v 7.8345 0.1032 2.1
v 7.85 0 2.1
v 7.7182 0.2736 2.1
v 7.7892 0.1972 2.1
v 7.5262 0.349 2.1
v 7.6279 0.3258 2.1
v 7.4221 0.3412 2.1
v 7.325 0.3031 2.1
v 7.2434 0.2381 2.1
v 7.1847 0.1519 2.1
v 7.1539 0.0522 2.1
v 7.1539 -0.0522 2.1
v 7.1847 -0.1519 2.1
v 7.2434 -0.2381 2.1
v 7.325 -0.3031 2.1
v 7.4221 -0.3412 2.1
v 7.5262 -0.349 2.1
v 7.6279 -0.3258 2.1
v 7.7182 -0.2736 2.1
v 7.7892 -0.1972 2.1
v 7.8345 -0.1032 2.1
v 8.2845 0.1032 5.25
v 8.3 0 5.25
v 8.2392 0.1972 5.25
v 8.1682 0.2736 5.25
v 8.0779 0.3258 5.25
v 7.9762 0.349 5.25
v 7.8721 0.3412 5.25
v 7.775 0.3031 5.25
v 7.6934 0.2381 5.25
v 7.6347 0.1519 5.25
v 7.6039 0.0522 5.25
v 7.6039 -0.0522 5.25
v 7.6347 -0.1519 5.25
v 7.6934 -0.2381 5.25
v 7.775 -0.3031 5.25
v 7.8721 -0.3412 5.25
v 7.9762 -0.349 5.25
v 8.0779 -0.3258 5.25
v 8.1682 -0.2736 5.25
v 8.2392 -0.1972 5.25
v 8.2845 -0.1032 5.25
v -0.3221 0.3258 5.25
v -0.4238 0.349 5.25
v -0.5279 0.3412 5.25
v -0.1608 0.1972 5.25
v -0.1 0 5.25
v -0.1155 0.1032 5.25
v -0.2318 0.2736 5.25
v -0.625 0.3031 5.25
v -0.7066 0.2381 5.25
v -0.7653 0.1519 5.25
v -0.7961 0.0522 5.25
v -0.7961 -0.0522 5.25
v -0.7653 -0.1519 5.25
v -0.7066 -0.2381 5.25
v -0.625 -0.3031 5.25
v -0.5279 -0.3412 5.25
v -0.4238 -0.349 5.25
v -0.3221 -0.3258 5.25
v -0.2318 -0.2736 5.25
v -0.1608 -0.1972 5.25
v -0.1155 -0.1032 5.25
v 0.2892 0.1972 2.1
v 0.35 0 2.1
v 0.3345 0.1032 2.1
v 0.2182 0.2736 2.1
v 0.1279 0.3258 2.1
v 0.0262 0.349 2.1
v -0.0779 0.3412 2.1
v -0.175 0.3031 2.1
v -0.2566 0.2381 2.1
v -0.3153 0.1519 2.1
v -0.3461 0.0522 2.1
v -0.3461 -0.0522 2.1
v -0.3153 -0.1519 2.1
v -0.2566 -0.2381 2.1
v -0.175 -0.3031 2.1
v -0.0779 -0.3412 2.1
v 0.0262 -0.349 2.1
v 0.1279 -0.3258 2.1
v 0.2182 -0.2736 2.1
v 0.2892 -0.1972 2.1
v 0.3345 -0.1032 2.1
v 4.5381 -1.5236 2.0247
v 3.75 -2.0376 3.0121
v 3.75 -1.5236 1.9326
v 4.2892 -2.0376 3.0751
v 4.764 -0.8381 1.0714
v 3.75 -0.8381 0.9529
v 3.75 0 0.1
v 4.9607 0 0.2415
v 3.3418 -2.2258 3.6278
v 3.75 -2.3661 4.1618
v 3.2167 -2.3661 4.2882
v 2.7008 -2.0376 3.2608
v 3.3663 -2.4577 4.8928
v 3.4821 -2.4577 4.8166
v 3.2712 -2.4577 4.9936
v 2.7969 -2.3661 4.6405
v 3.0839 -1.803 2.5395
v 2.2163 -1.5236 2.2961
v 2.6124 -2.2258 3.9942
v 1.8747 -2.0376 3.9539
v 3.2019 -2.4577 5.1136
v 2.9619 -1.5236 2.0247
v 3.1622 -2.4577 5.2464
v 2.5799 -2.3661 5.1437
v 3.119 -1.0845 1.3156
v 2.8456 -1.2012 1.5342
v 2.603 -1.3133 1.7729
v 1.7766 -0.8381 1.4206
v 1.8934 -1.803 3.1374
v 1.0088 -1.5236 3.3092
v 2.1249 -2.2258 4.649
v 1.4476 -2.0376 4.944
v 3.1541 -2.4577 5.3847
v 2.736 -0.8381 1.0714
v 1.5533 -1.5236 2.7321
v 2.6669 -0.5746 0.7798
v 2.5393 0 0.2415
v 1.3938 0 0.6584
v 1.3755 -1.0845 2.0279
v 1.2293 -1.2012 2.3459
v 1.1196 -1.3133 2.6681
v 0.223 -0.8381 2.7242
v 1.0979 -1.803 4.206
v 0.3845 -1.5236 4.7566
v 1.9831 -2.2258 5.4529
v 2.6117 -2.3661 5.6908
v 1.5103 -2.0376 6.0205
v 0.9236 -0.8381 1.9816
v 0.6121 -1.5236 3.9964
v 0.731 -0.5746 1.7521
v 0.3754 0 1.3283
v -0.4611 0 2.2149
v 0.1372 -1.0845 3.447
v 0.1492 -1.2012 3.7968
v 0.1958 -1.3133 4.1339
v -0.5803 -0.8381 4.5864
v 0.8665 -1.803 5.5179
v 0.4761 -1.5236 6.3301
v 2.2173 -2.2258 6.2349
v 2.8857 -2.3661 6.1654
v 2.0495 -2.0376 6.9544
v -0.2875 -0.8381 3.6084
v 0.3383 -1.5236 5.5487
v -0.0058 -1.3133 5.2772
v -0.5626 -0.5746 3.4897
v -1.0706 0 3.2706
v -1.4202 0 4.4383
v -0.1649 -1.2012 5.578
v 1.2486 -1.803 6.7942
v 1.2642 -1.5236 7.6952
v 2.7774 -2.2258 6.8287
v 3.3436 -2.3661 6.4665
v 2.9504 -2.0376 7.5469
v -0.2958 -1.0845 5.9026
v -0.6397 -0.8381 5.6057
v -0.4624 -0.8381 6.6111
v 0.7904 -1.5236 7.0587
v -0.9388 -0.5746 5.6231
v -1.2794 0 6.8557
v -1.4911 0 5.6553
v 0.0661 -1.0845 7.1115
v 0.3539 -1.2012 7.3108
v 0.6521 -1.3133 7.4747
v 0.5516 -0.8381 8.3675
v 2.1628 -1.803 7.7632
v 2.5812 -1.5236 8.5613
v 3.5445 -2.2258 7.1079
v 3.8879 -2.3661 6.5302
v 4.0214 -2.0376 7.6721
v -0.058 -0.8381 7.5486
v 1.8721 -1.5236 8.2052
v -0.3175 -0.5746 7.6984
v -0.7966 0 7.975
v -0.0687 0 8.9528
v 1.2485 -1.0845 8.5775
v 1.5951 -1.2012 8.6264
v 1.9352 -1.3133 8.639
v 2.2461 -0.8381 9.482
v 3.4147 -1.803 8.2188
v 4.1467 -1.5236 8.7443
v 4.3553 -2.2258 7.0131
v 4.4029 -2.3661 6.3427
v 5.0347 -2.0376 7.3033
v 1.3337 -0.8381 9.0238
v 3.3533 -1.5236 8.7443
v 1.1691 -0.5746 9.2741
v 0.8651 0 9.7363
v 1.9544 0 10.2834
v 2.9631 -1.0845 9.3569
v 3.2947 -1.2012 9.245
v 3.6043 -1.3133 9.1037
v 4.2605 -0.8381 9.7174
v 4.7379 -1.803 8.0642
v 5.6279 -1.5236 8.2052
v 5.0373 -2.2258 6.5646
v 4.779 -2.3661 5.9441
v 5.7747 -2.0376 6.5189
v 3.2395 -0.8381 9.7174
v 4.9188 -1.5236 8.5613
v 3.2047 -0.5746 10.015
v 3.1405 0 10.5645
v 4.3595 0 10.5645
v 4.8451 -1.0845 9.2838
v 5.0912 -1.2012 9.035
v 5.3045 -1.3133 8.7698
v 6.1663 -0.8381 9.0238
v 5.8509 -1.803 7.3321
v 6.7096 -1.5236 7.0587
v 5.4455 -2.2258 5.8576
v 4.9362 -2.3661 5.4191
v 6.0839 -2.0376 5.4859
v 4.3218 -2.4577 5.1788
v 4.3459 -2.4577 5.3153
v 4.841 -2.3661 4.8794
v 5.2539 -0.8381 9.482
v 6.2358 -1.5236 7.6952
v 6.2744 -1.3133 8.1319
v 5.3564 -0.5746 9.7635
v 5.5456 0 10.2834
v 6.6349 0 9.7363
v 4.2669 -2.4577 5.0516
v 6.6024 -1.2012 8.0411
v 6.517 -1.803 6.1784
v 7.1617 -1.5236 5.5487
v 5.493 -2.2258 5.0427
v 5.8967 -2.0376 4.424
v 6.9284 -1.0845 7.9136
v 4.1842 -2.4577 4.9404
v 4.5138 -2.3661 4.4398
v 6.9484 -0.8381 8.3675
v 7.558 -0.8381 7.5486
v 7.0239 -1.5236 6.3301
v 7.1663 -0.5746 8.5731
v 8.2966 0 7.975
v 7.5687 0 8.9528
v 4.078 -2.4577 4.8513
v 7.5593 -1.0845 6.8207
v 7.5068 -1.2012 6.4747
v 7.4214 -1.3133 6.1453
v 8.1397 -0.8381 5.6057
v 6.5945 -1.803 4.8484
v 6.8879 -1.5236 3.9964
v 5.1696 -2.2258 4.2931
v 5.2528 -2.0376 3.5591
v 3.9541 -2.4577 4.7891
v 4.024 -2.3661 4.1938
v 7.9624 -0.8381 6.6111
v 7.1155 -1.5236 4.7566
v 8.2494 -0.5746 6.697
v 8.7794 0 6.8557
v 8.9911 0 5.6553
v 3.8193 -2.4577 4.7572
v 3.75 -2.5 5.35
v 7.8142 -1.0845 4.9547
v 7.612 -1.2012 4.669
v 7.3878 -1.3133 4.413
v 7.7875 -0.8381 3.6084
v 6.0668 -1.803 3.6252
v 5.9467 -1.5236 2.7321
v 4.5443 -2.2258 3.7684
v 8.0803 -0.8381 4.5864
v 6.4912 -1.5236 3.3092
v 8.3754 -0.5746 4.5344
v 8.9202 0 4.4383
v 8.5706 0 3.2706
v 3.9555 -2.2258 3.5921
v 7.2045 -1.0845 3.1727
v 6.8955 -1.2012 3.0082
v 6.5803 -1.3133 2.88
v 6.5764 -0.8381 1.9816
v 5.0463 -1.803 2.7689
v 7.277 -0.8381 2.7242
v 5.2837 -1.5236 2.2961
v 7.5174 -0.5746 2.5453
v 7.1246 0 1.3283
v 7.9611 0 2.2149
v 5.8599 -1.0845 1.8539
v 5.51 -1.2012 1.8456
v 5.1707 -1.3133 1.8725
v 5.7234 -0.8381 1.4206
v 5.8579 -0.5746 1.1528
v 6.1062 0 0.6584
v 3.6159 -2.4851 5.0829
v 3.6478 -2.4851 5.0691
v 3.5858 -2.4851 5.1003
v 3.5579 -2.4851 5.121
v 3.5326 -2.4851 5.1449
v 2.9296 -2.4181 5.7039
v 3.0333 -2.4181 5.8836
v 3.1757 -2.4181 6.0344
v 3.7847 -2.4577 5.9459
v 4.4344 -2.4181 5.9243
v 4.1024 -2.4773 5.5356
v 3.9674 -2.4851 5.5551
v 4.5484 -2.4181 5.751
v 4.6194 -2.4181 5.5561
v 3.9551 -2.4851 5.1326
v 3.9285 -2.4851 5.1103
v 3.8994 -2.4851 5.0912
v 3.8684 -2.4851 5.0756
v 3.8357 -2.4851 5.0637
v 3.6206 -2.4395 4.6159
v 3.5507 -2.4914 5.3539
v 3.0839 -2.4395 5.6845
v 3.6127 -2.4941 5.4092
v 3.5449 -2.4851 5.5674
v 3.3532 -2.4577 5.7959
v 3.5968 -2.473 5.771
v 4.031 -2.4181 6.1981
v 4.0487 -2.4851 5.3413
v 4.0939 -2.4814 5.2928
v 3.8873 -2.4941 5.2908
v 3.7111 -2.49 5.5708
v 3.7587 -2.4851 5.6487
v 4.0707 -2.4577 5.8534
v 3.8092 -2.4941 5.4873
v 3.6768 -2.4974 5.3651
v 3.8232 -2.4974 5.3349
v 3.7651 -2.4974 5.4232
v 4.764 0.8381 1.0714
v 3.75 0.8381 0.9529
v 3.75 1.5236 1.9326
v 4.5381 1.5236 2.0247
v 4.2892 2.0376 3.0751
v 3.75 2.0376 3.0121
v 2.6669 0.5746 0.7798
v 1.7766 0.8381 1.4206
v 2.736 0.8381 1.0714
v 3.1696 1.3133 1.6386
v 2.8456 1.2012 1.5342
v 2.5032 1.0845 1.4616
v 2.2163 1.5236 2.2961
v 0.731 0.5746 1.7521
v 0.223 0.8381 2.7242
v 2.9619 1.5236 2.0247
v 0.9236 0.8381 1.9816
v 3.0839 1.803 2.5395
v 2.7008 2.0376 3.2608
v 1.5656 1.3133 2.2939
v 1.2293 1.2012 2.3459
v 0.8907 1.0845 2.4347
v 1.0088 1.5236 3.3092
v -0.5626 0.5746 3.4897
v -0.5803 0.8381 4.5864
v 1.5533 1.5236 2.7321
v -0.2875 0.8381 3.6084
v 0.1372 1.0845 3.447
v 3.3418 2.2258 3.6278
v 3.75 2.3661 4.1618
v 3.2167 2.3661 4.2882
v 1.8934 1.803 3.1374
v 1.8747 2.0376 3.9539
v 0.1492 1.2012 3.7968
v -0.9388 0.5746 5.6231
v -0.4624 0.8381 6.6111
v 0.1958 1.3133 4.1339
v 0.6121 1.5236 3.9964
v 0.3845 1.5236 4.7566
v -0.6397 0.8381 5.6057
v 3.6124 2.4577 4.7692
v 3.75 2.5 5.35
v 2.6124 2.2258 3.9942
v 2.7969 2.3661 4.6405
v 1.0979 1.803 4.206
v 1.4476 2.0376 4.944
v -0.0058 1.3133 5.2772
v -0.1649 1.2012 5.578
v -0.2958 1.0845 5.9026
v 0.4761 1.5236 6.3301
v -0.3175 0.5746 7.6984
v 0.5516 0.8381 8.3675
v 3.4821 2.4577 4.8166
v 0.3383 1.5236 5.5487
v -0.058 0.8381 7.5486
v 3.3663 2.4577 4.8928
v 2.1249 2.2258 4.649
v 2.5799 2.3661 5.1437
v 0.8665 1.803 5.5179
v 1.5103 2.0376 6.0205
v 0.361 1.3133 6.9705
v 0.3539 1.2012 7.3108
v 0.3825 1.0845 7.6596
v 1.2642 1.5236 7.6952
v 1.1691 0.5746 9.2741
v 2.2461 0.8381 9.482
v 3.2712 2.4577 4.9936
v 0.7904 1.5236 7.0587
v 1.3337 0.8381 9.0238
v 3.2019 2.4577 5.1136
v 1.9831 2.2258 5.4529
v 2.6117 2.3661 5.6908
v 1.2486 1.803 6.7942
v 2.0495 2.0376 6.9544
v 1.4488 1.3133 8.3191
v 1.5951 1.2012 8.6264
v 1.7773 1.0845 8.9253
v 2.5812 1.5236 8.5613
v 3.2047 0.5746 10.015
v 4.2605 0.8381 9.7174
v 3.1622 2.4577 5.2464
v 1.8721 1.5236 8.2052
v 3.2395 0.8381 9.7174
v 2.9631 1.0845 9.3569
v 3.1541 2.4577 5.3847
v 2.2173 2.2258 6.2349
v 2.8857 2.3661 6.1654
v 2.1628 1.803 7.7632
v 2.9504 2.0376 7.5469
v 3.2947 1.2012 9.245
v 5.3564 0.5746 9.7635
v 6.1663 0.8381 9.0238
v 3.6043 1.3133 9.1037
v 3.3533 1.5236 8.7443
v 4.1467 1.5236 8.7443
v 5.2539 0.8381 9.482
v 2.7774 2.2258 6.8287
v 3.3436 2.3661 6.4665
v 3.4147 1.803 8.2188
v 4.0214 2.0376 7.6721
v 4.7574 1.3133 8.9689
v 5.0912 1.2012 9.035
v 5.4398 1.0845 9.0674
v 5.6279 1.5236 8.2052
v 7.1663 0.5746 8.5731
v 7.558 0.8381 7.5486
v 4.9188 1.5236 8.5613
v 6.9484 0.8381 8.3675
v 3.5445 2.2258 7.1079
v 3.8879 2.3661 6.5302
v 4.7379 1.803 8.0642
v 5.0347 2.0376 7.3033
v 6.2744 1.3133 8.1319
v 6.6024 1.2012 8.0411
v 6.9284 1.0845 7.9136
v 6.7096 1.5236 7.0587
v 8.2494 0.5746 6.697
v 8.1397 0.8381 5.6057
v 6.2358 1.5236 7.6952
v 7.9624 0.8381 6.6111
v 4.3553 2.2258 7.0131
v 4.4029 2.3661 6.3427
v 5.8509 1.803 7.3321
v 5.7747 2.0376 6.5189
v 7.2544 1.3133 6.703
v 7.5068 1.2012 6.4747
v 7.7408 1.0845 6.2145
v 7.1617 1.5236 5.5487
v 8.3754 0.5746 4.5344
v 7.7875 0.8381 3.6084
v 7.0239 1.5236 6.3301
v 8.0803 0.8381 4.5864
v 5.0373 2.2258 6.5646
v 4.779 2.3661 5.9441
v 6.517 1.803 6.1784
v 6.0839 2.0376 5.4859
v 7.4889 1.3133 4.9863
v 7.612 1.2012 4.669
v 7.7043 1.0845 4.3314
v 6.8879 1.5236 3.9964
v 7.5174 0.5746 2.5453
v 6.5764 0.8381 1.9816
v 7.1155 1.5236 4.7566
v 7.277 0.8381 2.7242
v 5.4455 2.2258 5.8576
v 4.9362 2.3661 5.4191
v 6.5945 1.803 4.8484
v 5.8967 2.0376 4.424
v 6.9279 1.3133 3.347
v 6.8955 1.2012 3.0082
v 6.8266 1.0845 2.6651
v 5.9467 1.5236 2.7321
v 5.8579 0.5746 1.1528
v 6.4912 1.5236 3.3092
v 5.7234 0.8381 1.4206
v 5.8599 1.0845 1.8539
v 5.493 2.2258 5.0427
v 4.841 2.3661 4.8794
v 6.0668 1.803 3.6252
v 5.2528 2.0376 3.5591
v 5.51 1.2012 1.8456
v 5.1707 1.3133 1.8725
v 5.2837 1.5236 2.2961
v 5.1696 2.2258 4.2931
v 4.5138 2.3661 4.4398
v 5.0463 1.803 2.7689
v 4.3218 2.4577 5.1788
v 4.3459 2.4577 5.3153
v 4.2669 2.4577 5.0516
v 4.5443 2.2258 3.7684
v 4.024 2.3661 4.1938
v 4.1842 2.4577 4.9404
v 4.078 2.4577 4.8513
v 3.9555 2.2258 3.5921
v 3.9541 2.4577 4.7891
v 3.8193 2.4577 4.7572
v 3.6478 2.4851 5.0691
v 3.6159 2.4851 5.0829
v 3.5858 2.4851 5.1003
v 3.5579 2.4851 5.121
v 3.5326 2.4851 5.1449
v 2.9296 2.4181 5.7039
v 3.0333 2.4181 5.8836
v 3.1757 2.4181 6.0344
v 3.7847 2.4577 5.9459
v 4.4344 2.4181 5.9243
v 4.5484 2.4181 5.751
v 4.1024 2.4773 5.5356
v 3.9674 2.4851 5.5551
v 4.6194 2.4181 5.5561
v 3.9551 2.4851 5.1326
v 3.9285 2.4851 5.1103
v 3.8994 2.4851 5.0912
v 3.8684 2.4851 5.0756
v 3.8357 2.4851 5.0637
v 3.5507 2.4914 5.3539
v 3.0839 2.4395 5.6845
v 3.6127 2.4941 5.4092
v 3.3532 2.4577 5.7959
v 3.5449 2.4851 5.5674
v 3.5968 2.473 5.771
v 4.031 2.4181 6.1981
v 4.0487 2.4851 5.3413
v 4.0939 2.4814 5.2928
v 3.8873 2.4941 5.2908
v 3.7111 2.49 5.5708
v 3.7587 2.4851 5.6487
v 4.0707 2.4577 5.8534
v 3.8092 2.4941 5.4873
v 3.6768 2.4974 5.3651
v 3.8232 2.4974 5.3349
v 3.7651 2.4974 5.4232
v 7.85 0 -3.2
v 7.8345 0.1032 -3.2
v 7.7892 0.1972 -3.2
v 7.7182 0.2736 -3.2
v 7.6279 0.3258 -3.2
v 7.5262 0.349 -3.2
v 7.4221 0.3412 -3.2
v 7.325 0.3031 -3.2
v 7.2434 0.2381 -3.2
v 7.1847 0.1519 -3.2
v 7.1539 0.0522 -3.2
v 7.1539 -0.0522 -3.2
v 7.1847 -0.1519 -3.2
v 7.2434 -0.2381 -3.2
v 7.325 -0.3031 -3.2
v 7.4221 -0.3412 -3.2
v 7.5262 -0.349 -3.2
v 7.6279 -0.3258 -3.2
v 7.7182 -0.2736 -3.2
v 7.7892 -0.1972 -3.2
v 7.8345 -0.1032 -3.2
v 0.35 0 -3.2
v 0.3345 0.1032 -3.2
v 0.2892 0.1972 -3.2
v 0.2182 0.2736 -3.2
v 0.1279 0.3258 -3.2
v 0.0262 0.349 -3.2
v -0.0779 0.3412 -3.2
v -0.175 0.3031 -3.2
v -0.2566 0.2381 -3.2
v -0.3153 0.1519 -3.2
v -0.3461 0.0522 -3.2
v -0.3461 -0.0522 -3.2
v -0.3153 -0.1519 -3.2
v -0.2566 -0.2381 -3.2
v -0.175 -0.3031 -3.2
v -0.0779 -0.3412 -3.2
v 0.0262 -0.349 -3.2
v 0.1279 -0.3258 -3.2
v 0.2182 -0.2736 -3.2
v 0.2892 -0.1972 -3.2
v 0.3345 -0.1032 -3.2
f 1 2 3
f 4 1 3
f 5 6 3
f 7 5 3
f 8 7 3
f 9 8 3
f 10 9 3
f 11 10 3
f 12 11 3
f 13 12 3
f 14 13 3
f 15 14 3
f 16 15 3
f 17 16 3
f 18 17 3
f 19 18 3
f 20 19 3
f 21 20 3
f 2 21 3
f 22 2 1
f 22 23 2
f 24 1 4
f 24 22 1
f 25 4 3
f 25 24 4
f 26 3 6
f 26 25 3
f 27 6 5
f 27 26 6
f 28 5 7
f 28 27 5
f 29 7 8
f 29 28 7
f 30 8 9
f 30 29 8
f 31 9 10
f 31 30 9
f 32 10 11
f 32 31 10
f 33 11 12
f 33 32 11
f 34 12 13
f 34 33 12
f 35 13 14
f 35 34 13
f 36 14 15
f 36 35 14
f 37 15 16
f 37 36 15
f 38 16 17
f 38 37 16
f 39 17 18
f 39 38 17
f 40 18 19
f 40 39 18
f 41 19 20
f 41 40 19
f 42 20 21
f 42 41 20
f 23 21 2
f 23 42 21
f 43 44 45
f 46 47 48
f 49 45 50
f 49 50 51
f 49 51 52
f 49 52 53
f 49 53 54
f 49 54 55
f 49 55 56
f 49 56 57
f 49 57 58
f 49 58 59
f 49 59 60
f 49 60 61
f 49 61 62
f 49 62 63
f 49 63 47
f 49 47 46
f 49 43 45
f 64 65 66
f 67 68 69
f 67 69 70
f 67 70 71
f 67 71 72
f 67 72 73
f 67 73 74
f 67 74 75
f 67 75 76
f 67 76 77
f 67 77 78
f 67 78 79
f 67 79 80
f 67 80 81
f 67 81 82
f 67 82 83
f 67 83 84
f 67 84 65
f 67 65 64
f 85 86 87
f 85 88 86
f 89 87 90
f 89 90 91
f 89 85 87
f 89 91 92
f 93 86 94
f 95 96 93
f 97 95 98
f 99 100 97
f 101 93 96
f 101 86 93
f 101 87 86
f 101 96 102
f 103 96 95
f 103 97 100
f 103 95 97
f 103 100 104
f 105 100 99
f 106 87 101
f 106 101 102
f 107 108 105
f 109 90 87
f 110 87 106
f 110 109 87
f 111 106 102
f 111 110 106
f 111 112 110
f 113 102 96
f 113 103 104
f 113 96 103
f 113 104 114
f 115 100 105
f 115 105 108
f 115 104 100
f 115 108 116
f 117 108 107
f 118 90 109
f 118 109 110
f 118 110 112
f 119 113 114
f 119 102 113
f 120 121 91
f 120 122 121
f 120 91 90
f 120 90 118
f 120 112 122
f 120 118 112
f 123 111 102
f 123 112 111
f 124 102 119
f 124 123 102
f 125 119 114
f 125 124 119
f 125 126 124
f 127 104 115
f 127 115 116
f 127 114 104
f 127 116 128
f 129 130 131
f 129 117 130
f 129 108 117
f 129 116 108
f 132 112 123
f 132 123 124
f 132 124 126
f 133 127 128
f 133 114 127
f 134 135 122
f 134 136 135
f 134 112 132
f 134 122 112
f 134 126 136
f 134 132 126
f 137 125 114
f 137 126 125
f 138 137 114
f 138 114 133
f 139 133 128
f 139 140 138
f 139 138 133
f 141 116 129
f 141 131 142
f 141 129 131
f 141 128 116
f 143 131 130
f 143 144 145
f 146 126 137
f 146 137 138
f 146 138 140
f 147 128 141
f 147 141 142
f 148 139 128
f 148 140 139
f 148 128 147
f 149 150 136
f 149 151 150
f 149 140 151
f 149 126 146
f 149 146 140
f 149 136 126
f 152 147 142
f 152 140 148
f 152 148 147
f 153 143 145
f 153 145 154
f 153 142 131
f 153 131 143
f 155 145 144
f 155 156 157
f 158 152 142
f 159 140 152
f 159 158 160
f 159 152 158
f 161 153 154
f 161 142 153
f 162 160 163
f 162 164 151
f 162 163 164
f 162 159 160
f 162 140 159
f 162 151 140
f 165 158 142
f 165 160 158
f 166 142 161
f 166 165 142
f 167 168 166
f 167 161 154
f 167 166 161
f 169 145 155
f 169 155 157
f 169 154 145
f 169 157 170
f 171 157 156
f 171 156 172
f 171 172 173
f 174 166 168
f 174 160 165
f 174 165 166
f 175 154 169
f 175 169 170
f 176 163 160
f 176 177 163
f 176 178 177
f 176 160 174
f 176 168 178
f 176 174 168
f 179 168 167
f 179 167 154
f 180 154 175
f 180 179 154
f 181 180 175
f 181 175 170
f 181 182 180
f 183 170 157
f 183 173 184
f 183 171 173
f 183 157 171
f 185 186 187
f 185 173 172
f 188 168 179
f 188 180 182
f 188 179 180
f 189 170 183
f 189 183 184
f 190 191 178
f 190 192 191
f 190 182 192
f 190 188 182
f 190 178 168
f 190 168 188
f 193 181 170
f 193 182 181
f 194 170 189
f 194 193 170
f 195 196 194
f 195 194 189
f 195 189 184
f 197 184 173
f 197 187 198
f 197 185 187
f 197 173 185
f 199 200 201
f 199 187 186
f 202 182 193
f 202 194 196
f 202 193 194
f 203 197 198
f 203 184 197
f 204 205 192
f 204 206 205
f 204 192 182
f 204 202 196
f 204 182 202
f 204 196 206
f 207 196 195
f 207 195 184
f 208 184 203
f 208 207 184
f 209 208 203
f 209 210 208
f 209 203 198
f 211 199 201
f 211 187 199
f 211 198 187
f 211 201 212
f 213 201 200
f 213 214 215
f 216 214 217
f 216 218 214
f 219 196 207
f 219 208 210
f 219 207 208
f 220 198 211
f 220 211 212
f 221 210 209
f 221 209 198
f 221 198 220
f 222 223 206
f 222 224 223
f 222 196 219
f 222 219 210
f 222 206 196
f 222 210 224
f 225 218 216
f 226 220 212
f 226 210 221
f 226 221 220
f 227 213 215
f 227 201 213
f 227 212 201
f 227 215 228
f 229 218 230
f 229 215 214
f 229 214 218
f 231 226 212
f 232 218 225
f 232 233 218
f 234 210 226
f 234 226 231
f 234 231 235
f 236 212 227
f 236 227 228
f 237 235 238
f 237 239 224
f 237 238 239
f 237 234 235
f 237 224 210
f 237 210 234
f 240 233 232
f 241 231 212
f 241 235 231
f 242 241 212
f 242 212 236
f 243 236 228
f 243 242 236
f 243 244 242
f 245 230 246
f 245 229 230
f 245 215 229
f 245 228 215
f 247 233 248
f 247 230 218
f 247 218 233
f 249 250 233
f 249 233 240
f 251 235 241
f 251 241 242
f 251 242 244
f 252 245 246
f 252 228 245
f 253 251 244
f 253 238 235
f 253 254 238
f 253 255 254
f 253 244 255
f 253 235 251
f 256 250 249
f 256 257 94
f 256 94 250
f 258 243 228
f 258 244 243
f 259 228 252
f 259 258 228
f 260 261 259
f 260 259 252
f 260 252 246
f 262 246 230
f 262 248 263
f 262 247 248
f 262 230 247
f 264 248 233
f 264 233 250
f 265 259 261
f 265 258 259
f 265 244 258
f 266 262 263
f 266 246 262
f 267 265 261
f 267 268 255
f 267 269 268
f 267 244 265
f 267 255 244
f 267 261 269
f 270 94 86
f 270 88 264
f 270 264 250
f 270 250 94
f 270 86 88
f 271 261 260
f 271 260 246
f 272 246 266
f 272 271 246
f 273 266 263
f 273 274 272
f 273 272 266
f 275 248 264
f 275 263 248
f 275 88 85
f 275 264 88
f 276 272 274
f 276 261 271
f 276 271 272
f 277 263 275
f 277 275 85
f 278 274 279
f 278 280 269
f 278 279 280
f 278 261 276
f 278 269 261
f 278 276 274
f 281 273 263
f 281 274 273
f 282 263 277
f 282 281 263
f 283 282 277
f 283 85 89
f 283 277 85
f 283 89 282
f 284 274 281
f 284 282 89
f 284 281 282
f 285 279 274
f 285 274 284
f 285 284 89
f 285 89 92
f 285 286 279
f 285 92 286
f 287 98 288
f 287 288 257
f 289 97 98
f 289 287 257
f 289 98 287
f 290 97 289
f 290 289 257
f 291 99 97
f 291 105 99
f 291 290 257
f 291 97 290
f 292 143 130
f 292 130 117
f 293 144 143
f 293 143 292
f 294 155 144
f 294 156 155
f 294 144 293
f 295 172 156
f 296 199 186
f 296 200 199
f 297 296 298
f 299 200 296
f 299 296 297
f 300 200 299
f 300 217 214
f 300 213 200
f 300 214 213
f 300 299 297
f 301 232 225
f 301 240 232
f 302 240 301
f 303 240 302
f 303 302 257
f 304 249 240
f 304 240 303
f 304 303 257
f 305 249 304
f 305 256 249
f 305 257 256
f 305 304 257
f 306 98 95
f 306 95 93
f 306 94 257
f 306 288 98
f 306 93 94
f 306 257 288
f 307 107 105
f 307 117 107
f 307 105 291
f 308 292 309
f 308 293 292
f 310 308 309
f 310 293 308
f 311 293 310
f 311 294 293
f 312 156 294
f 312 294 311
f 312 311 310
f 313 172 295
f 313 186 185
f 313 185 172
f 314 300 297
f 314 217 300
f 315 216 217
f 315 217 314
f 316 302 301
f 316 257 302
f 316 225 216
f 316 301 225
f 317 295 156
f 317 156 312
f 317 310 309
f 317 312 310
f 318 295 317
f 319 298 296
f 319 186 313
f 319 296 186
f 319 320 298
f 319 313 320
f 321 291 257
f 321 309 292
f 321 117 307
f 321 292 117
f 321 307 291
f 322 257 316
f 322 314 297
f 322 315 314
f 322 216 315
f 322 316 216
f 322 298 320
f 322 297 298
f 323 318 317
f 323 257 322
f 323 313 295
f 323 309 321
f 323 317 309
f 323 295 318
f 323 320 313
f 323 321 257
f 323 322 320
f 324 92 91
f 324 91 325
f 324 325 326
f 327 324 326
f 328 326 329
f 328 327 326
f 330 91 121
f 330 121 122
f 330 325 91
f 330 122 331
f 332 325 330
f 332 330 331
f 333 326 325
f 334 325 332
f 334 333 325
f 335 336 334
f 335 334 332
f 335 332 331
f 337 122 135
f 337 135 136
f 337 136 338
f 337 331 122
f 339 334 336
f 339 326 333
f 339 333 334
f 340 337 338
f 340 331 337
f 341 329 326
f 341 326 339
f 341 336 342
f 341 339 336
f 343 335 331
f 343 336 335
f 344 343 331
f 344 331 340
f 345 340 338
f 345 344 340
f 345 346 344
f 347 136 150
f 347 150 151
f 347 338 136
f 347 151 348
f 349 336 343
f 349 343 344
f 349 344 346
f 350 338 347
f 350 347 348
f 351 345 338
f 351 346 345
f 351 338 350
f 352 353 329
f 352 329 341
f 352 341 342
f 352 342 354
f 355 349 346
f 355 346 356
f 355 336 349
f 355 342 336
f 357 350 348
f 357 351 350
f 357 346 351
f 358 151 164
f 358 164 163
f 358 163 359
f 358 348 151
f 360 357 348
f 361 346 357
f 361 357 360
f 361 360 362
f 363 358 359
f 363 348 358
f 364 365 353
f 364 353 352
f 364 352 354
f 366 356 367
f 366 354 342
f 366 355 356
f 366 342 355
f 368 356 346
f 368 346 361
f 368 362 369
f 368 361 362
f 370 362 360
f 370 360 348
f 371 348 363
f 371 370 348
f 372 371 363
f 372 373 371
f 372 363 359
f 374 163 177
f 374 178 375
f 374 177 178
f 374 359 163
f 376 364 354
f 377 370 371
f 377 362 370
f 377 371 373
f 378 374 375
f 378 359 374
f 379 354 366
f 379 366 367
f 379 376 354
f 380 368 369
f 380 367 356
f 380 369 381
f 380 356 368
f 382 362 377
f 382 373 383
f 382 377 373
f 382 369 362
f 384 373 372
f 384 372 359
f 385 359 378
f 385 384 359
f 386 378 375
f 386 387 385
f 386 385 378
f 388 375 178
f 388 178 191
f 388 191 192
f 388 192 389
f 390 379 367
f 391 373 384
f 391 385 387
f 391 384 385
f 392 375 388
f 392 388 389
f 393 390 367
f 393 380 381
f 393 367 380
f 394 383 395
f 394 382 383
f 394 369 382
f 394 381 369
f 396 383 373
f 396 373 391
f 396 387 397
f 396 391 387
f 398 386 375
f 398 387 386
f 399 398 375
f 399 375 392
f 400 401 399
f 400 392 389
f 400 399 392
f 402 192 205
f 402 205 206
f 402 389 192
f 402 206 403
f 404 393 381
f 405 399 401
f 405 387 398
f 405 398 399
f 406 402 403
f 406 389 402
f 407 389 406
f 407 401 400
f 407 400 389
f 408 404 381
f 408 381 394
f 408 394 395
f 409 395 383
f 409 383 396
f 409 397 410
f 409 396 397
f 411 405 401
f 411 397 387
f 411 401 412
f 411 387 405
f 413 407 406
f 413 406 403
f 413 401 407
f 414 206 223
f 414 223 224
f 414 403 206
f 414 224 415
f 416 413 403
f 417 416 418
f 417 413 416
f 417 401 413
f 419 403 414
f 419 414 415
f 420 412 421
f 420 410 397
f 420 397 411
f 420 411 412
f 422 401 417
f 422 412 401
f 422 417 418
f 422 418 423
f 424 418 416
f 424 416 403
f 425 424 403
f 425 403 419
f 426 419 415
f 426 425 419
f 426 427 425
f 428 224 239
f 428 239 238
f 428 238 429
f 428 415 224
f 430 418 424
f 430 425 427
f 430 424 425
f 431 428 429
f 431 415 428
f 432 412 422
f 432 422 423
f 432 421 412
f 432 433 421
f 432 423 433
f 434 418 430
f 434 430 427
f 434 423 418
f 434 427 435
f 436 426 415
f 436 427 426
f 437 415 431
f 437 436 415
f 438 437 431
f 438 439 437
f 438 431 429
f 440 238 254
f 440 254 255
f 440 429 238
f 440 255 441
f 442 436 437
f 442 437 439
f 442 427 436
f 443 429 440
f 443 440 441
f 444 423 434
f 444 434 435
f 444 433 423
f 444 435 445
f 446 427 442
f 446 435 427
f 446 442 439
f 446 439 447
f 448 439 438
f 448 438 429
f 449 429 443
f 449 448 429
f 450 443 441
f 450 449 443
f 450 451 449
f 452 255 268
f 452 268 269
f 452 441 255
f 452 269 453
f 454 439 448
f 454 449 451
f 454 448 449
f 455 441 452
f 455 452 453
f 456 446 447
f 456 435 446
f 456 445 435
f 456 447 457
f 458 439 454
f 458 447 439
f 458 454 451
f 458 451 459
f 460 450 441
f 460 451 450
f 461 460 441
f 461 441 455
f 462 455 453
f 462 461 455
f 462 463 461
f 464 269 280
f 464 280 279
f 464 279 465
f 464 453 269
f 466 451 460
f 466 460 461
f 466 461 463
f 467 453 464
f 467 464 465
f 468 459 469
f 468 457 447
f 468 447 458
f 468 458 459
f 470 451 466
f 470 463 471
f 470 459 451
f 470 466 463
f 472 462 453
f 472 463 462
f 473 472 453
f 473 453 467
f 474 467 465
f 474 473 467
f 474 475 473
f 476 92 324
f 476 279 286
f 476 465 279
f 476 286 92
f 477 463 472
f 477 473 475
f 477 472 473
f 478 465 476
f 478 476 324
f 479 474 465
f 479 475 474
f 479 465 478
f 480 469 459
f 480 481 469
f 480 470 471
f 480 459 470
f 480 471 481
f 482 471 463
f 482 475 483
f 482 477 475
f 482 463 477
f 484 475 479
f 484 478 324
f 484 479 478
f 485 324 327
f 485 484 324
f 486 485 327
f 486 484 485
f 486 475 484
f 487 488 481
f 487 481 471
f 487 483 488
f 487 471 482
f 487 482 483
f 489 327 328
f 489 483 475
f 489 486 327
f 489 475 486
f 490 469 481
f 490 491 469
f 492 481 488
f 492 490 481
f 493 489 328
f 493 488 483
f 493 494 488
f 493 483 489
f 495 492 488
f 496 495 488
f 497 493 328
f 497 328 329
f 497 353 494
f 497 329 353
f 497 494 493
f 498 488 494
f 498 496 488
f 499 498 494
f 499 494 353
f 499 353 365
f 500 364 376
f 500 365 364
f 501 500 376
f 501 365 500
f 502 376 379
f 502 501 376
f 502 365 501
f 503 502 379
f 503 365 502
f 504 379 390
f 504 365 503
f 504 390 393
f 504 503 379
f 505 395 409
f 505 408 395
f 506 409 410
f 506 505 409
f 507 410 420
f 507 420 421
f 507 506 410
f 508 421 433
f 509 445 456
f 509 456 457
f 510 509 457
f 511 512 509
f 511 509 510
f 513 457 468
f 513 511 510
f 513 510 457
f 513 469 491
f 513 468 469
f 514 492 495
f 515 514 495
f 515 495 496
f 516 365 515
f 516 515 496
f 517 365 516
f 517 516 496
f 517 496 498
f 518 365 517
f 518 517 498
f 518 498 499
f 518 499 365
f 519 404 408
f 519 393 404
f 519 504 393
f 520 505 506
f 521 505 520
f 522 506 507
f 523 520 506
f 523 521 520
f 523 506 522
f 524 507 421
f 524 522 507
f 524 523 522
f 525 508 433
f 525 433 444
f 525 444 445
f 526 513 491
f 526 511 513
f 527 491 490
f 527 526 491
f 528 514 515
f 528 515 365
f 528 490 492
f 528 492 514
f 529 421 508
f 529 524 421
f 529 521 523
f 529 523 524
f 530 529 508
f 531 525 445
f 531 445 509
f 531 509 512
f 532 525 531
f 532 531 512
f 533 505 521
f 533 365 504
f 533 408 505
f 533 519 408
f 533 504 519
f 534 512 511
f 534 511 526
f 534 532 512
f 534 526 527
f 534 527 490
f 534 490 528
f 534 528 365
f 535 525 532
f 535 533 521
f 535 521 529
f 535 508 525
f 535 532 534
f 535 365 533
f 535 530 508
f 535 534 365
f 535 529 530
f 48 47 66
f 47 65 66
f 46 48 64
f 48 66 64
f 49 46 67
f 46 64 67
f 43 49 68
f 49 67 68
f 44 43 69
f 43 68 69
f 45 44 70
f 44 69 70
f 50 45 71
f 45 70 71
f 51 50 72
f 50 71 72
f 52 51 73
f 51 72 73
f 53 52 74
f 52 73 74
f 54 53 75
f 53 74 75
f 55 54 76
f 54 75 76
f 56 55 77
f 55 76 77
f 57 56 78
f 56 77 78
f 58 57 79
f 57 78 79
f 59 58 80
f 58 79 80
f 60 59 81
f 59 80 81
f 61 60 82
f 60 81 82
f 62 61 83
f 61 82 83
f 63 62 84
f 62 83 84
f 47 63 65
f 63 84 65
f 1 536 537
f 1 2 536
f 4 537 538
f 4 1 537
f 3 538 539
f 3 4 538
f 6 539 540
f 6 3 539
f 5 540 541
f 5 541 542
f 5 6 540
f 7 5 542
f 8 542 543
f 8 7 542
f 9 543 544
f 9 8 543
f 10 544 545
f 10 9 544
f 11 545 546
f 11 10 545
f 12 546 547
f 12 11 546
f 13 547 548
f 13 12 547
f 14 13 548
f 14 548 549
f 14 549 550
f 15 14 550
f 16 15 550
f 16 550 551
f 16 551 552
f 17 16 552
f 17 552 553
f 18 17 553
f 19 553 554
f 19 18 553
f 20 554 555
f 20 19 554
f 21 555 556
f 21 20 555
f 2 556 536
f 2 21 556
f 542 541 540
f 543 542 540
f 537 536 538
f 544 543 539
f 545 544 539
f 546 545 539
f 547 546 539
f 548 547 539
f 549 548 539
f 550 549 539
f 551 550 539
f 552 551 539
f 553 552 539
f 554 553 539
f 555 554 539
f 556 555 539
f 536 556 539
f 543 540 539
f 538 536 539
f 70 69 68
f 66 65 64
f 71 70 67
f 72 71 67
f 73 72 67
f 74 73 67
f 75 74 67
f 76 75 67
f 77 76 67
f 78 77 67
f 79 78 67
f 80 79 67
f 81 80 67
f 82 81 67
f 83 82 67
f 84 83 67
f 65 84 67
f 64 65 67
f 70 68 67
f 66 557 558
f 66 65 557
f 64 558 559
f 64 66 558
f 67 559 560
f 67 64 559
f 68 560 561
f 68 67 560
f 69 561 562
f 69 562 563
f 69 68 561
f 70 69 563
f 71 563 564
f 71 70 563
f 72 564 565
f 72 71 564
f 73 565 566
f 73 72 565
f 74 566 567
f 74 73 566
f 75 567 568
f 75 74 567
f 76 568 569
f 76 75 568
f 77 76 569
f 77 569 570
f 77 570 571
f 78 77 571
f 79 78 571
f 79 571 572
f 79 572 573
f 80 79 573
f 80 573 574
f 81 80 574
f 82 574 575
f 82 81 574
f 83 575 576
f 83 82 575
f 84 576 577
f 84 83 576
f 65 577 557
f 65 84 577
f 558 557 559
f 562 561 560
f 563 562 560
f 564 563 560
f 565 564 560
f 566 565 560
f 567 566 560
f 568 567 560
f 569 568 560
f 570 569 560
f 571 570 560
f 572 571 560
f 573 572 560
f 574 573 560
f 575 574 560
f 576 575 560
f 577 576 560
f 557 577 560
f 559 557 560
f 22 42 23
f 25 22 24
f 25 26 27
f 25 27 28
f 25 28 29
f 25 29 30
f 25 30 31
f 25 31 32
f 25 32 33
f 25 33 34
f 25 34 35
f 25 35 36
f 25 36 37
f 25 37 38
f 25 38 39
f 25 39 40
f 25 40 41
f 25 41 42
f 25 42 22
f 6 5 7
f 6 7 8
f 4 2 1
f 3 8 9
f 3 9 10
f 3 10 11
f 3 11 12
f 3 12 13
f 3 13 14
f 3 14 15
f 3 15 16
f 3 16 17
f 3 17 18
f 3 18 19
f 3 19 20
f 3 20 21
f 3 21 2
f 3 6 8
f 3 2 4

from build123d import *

# Parameters (mm, degrees)
SKETCH001_R       = 0.35
PAD001_DEPTH      = 2.1
PAD001_DEPTH_BACK = 3.2
SKETCH002_R       = 0.35
SKETCH003_R       = 0.35
SKETCH004_R       = 0.35
SKETCH005_R       = 0.35


with BuildPart() as pad001:
    # Sketch001 → Pad001 (new body, two sides)
    with BuildSketch(Plane.XY) as pad001_sk:
        Circle(SKETCH001_R)
        with Locations((7.5, 0)):
            Circle(SKETCH001_R)
    extrude(amount=PAD001_DEPTH)
    extrude(pad001_sk.sketch, amount=-PAD001_DEPTH_BACK)


with BuildPart() as revolution:
    # Sketch → Revolution (revolve)
    with BuildSketch(Plane.YZ.offset(3.75)):
        with BuildLine():
            Line((-2.5, 5.35), (2.5, 5.35))
            ThreePointArc((0, 0.1), (1.803019, 2.461658), (2.5, 5.35))
            ThreePointArc((-2.5, 5.35), (-1.803019, 2.461658), (0, 0.1))
        make_face()
    revolve(axis=Axis((3.75, -3.32079, 5.35), (0, 1, 0)))


with BuildPart() as loft_body:
    # Sketch002 → Loft section 0
    with BuildSketch(Plane.XY.offset(5.25)):
        with Locations((-0.45, 0)):
            Circle(SKETCH002_R)
    # Sketch003 → Loft section 1
    with BuildSketch(Plane.XY.offset(2.1)):
        Circle(SKETCH003_R)
    loft()


with BuildPart() as loft001:
    # Sketch004 → Loft001 section 0
    with BuildSketch(Plane.XY.offset(2.1)):
        with Locations((7.5, 0)):
            Circle(SKETCH004_R)
    # Sketch005 → Loft001 section 1
    with BuildSketch(Plane.XY.offset(5.25)):
        with Locations((7.95, 0)):
            Circle(SKETCH005_R)
    loft()


solid = Compound([pad001.part, revolution.part, loft_body.part, loft001.part])
